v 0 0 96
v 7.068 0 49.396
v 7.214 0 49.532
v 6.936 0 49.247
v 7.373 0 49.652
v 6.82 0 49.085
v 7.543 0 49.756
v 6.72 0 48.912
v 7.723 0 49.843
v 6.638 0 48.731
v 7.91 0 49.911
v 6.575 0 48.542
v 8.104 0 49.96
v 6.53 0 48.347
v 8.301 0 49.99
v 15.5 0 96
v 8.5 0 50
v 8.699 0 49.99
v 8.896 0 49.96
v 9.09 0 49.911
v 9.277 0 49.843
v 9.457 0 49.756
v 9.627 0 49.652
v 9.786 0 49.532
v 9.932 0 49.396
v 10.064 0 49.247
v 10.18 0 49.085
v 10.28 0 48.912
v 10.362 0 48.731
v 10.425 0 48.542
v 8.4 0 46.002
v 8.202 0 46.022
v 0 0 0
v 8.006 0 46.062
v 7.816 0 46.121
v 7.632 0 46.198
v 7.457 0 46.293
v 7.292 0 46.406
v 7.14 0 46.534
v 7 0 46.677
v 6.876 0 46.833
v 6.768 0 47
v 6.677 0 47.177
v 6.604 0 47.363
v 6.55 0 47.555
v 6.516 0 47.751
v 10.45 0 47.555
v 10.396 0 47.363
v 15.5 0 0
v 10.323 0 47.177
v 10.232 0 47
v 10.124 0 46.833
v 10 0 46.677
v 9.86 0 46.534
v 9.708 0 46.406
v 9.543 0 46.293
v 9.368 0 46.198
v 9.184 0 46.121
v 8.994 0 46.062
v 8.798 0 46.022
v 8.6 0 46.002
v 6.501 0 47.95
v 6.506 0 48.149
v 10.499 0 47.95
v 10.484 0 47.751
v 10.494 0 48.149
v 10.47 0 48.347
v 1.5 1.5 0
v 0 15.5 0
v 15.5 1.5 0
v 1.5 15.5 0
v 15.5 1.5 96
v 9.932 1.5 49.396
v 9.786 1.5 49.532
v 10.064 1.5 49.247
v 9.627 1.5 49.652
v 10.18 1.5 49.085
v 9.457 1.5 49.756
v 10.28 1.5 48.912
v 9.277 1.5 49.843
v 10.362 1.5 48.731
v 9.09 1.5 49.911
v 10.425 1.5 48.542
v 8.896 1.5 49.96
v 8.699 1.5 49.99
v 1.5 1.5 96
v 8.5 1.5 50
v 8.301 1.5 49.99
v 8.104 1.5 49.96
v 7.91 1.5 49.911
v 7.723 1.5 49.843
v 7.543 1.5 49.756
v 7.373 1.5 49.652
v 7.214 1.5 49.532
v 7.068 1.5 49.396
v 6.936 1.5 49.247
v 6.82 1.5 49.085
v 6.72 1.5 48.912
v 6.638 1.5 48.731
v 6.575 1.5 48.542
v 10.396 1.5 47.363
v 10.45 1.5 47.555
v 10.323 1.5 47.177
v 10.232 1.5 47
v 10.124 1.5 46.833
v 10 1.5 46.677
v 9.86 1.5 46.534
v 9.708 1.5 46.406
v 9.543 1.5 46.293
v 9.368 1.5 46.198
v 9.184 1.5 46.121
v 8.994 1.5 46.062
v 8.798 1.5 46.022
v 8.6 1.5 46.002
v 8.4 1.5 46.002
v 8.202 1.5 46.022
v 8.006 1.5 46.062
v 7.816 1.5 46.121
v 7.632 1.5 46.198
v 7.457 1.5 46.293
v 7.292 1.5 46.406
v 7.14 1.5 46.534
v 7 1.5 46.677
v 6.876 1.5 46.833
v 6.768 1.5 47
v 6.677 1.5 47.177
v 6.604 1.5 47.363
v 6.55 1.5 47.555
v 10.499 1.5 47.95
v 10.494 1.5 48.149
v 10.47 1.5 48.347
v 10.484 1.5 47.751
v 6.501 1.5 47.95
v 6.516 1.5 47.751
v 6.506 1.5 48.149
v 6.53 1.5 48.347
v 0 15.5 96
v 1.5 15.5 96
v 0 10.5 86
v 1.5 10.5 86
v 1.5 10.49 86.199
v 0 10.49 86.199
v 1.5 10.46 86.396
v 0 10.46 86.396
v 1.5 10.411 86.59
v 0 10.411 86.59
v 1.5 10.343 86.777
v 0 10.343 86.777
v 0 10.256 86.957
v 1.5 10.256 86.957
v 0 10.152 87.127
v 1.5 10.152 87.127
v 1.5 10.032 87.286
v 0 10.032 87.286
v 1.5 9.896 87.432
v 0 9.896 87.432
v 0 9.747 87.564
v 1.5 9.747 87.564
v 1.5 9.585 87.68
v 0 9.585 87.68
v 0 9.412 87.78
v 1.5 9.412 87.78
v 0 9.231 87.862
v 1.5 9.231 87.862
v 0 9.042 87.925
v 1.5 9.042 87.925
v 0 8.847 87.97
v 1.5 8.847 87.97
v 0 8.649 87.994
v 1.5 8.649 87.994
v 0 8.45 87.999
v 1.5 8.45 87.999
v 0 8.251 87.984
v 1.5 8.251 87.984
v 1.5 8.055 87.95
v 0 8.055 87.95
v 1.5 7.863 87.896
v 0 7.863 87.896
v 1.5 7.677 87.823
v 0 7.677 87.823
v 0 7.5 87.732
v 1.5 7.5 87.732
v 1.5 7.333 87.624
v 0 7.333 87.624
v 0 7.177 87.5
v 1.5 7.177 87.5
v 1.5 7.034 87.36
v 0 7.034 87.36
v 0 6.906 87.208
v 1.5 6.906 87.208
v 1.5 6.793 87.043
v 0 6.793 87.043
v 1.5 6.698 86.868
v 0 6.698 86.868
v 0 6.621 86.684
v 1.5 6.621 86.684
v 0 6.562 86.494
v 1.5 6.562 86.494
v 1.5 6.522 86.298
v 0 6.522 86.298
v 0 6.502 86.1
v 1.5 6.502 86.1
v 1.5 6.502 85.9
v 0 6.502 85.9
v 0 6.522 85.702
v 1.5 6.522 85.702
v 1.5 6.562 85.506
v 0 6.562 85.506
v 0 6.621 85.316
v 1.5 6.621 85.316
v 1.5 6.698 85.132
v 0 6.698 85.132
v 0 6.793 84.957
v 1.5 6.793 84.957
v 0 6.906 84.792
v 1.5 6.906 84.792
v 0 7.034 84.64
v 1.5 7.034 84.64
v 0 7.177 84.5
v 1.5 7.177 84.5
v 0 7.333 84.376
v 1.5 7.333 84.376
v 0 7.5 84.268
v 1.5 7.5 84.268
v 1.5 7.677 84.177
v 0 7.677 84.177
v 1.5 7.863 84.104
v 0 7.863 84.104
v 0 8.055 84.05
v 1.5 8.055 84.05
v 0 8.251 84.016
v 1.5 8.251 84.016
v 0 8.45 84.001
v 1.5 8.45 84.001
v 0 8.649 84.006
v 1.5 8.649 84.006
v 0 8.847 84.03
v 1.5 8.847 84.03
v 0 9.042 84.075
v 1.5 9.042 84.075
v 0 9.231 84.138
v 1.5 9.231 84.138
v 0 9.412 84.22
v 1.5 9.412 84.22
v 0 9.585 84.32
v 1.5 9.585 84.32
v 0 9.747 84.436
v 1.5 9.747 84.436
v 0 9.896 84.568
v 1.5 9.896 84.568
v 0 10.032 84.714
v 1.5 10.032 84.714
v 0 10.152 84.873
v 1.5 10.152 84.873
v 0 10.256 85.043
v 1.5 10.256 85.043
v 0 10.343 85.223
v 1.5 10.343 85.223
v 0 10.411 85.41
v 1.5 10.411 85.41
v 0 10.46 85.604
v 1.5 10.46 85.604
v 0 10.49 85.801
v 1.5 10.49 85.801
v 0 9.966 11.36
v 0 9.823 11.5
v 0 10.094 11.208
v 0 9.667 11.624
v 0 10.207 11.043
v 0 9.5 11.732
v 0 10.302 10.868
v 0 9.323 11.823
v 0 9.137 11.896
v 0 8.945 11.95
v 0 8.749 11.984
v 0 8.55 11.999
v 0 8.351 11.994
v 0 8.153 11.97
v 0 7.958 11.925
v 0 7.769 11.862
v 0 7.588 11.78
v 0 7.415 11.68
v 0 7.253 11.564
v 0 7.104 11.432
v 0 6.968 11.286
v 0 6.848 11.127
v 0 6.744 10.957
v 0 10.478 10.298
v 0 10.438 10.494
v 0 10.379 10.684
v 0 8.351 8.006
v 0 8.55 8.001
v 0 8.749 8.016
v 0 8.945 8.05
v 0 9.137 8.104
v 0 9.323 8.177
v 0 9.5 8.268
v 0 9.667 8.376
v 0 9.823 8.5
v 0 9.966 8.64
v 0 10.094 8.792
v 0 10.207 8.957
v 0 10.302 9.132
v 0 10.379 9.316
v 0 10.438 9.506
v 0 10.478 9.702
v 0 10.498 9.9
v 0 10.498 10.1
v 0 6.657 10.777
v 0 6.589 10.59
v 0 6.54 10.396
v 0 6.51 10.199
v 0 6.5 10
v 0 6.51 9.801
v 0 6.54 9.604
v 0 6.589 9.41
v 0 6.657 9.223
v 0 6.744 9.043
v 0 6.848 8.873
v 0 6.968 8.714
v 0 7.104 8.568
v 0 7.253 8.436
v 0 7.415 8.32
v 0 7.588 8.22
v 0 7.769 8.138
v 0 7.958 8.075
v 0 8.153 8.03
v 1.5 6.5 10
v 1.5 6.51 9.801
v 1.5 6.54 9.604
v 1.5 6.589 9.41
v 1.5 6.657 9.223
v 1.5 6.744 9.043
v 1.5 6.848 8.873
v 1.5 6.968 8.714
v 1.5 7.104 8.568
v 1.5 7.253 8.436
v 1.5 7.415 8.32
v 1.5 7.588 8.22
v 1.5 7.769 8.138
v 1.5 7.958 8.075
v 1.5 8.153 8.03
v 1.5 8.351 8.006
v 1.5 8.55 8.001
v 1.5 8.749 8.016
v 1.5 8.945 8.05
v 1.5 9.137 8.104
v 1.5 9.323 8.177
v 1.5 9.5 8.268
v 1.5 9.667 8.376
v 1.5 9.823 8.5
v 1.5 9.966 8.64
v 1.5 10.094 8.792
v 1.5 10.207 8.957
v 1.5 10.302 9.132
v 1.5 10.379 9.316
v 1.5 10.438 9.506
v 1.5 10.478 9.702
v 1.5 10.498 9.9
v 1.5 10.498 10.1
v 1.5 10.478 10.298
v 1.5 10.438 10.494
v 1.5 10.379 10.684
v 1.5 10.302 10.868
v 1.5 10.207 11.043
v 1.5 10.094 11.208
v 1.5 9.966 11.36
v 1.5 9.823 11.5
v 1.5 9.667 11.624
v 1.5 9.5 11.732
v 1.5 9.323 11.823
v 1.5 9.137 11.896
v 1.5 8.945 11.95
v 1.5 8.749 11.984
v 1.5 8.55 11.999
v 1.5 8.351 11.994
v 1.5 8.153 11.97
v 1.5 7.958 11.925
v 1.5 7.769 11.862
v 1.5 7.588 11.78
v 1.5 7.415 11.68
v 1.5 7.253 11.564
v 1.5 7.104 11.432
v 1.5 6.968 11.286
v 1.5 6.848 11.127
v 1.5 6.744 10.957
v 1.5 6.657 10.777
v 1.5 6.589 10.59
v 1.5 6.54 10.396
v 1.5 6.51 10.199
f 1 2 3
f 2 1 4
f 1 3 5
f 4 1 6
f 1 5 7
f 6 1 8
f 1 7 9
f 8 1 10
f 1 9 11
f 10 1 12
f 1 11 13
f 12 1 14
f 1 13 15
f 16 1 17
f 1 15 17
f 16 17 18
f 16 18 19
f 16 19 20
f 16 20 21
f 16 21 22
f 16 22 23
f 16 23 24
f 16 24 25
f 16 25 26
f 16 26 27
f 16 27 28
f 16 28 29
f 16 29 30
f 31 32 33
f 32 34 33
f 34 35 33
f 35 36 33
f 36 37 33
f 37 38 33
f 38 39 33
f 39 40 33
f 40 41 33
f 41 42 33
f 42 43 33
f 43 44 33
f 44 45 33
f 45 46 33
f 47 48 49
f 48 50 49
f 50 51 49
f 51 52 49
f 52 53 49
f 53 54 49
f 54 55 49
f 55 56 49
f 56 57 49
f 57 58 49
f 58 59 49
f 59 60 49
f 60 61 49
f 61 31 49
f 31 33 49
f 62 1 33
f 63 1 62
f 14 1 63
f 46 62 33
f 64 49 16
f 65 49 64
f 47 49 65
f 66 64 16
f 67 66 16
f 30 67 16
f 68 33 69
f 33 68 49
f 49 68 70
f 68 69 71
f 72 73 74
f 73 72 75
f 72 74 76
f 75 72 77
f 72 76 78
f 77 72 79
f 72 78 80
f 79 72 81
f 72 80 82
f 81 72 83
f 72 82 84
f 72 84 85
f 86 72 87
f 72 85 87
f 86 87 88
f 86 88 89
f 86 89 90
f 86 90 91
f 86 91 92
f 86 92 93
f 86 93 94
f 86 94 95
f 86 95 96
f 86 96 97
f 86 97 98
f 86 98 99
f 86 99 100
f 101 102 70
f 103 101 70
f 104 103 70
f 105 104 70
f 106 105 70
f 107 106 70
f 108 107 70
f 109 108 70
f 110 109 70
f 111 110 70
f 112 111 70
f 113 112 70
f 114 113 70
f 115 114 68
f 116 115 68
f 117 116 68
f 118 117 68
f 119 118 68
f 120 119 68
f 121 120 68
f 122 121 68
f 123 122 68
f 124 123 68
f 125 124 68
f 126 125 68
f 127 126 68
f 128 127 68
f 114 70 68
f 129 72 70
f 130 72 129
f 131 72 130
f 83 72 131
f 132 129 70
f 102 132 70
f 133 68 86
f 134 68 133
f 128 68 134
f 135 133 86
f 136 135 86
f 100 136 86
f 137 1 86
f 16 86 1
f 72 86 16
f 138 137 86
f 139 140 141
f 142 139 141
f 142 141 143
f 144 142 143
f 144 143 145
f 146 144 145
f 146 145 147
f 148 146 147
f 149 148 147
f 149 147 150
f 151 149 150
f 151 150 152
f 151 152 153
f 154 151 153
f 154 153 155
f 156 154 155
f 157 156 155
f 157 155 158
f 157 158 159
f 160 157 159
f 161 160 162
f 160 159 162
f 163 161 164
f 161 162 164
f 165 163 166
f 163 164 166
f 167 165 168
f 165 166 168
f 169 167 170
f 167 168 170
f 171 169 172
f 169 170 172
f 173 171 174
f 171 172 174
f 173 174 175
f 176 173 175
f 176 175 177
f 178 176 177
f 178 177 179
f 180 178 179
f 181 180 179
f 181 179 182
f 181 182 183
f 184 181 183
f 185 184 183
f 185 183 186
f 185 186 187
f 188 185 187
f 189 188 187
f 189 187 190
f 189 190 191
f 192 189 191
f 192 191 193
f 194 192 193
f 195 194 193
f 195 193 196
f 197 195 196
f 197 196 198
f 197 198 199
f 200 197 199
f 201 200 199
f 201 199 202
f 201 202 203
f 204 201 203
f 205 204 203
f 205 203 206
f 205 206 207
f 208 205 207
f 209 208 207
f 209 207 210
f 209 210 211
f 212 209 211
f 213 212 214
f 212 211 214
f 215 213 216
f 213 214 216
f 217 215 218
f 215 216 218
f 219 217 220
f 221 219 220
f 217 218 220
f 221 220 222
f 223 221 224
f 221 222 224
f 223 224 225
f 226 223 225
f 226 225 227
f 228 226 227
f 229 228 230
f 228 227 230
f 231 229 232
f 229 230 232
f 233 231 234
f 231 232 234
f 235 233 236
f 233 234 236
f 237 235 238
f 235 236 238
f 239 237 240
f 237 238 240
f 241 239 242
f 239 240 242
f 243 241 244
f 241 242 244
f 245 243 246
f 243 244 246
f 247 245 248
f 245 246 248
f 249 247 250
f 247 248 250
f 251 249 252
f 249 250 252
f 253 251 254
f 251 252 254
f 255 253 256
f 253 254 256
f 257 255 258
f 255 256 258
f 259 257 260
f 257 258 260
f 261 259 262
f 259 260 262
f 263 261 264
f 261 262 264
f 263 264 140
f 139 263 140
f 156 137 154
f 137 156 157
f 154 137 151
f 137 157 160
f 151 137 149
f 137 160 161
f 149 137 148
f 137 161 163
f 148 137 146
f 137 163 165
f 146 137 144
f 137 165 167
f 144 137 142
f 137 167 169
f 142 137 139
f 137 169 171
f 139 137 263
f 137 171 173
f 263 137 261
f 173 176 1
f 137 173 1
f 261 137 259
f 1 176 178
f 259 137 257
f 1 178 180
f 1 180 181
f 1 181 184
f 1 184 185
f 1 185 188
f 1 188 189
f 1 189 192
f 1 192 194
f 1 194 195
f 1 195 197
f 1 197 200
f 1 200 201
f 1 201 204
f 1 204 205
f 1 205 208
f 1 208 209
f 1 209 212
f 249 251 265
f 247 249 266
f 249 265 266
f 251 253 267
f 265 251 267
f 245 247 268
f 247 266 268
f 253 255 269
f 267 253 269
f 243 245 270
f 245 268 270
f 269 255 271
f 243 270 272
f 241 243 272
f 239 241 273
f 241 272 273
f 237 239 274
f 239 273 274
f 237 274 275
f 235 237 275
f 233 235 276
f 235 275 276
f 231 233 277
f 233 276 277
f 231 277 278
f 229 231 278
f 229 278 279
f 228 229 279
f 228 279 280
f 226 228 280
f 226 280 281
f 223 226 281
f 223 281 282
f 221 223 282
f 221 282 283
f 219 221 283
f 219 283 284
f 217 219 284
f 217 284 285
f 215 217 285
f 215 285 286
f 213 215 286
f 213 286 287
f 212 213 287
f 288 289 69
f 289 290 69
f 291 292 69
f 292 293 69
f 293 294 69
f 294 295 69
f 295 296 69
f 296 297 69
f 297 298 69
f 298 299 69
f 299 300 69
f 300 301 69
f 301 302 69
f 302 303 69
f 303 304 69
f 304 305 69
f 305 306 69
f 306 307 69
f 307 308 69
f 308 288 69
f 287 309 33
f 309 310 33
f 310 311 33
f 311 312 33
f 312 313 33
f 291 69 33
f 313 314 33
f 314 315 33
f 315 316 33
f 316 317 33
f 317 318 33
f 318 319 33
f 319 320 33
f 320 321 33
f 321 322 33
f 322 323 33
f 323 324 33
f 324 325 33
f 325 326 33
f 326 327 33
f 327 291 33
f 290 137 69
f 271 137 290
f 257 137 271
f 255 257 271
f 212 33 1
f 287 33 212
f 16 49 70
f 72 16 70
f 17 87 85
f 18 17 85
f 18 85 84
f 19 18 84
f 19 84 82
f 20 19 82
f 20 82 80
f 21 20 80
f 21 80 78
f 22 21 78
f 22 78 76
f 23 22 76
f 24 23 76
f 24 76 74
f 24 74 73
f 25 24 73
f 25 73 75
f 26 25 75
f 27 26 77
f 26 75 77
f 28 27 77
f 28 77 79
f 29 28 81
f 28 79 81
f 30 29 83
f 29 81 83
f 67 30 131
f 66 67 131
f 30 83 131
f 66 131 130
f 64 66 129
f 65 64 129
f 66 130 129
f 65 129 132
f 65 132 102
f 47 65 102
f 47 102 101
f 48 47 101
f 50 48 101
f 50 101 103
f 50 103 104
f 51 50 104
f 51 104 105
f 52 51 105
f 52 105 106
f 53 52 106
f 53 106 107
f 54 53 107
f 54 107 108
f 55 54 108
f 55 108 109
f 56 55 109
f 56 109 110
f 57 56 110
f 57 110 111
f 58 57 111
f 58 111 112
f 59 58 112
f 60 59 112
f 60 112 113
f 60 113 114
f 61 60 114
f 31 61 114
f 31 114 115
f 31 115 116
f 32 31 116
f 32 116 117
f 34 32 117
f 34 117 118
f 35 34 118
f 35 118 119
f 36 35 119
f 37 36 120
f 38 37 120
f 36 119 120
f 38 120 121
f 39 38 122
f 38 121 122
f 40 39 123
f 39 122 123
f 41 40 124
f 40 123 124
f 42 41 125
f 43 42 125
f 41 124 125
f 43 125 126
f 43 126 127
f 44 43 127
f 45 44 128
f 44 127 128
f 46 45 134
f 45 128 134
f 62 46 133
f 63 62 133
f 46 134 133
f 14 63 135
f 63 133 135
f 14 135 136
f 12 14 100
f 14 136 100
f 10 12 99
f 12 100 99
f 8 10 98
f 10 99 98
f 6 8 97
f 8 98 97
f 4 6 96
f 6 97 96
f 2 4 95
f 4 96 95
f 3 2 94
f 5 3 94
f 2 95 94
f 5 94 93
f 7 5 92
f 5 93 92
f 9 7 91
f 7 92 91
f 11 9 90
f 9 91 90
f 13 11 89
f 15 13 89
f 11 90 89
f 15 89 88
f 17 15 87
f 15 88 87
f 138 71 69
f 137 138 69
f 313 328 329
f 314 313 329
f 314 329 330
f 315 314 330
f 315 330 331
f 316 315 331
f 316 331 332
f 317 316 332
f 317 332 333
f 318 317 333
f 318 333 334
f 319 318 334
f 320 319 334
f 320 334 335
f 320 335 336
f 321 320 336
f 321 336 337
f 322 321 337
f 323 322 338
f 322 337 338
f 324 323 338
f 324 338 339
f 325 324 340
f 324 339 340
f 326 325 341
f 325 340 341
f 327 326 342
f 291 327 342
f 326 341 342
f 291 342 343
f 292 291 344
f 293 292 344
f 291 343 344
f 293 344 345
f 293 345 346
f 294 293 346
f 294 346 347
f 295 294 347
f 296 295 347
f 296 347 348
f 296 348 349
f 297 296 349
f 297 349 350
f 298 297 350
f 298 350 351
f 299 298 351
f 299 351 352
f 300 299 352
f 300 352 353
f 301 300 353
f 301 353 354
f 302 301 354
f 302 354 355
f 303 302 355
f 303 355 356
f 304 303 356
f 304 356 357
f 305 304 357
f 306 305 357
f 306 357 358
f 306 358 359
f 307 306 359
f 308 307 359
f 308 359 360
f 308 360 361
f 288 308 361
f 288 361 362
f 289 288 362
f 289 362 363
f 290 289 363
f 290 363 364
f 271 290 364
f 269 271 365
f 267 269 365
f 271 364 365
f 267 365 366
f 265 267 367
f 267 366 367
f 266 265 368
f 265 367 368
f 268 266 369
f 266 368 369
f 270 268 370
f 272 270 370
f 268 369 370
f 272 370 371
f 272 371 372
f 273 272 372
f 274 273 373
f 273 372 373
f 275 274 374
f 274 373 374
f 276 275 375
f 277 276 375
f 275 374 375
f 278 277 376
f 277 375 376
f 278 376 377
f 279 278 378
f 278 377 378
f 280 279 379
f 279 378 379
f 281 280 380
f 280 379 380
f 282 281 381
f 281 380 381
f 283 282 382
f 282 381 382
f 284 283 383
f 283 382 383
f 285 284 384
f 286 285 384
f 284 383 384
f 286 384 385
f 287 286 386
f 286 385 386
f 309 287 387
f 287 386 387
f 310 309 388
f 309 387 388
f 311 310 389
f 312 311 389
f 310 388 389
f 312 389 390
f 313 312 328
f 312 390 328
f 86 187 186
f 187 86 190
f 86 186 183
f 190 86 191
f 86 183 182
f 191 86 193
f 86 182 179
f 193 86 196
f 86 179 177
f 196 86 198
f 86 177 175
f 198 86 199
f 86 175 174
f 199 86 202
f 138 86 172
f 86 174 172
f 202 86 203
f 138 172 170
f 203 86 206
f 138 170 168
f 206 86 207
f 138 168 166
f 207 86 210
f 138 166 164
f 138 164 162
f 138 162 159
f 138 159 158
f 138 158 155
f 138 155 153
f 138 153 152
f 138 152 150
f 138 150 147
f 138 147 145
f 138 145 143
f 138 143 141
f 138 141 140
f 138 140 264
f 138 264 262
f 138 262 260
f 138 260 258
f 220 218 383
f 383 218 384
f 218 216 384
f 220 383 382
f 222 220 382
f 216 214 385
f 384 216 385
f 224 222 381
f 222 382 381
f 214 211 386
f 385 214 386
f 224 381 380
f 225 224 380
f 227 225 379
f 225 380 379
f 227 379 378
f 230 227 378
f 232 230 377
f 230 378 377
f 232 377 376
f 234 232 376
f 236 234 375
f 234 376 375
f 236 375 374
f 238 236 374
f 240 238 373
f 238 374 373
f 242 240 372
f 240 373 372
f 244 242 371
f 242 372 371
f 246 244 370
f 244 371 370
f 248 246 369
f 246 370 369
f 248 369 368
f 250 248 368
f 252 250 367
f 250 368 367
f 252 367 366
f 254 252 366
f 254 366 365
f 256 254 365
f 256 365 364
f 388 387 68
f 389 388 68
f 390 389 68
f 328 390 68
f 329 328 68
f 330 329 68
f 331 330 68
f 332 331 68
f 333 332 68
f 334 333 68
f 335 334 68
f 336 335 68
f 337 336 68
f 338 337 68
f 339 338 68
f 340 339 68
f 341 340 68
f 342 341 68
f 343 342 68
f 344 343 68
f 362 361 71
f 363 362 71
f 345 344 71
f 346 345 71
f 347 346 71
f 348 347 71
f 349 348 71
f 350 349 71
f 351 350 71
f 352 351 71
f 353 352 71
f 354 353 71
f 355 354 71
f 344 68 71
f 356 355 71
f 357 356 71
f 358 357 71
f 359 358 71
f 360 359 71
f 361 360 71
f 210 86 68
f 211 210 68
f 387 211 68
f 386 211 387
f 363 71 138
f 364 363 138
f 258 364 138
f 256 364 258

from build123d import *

# Parameters (mm, degrees)
EXTRU_MINCE1_DEPTH      = 96
ESQUISSE2_R             = 2
ENL_V_MAT_EXTRU_1_DEPTH = 99.245865053
ESQUISSE3_R             = 2
ENL_V_MAT_EXTRU_2_DEPTH = 99.245865053


with BuildPart() as part:
    # Esquisse1 → Extru.-Mince1 (new body)
    with BuildSketch(Plane.XY):
        Polygon((0, 15.5), (0, 0), (15.5, 0), (15.5, 1.5), (1.5, 1.5), (1.5, 15.5), align=None)
    extrude(amount=EXTRU_MINCE1_DEPTH)

    # Esquisse2 → Enlèv. mat.-Extru.1 (cut, through all)
    with BuildSketch(Plane(origin=(1.5, 0, 0), x_dir=(0, 0, -1), z_dir=(1, 0, 0))):
        with Locations(Location((-86, 8.5, 0), (0, 0, 90))):
            Circle(ESQUISSE2_R)
        with Locations(Location((-10, 8.5, 0), (0, 0, 270))):
            Circle(ESQUISSE2_R)
    extrude(amount=-ENL_V_MAT_EXTRU_1_DEPTH, mode=Mode.SUBTRACT)

    # Esquisse3 → Enlèv. mat.-Extru.2 (cut, through all)
    with BuildSketch(Plane(origin=(0, 1.5, 0), x_dir=(1, 0, 0), z_dir=(0, 1, 0))):
        with Locations(Location((8.5, -48, 0), (0, 0, 270))):
            Circle(ESQUISSE3_R)
    extrude(amount=-ENL_V_MAT_EXTRU_2_DEPTH, mode=Mode.SUBTRACT)


solid = part.part
